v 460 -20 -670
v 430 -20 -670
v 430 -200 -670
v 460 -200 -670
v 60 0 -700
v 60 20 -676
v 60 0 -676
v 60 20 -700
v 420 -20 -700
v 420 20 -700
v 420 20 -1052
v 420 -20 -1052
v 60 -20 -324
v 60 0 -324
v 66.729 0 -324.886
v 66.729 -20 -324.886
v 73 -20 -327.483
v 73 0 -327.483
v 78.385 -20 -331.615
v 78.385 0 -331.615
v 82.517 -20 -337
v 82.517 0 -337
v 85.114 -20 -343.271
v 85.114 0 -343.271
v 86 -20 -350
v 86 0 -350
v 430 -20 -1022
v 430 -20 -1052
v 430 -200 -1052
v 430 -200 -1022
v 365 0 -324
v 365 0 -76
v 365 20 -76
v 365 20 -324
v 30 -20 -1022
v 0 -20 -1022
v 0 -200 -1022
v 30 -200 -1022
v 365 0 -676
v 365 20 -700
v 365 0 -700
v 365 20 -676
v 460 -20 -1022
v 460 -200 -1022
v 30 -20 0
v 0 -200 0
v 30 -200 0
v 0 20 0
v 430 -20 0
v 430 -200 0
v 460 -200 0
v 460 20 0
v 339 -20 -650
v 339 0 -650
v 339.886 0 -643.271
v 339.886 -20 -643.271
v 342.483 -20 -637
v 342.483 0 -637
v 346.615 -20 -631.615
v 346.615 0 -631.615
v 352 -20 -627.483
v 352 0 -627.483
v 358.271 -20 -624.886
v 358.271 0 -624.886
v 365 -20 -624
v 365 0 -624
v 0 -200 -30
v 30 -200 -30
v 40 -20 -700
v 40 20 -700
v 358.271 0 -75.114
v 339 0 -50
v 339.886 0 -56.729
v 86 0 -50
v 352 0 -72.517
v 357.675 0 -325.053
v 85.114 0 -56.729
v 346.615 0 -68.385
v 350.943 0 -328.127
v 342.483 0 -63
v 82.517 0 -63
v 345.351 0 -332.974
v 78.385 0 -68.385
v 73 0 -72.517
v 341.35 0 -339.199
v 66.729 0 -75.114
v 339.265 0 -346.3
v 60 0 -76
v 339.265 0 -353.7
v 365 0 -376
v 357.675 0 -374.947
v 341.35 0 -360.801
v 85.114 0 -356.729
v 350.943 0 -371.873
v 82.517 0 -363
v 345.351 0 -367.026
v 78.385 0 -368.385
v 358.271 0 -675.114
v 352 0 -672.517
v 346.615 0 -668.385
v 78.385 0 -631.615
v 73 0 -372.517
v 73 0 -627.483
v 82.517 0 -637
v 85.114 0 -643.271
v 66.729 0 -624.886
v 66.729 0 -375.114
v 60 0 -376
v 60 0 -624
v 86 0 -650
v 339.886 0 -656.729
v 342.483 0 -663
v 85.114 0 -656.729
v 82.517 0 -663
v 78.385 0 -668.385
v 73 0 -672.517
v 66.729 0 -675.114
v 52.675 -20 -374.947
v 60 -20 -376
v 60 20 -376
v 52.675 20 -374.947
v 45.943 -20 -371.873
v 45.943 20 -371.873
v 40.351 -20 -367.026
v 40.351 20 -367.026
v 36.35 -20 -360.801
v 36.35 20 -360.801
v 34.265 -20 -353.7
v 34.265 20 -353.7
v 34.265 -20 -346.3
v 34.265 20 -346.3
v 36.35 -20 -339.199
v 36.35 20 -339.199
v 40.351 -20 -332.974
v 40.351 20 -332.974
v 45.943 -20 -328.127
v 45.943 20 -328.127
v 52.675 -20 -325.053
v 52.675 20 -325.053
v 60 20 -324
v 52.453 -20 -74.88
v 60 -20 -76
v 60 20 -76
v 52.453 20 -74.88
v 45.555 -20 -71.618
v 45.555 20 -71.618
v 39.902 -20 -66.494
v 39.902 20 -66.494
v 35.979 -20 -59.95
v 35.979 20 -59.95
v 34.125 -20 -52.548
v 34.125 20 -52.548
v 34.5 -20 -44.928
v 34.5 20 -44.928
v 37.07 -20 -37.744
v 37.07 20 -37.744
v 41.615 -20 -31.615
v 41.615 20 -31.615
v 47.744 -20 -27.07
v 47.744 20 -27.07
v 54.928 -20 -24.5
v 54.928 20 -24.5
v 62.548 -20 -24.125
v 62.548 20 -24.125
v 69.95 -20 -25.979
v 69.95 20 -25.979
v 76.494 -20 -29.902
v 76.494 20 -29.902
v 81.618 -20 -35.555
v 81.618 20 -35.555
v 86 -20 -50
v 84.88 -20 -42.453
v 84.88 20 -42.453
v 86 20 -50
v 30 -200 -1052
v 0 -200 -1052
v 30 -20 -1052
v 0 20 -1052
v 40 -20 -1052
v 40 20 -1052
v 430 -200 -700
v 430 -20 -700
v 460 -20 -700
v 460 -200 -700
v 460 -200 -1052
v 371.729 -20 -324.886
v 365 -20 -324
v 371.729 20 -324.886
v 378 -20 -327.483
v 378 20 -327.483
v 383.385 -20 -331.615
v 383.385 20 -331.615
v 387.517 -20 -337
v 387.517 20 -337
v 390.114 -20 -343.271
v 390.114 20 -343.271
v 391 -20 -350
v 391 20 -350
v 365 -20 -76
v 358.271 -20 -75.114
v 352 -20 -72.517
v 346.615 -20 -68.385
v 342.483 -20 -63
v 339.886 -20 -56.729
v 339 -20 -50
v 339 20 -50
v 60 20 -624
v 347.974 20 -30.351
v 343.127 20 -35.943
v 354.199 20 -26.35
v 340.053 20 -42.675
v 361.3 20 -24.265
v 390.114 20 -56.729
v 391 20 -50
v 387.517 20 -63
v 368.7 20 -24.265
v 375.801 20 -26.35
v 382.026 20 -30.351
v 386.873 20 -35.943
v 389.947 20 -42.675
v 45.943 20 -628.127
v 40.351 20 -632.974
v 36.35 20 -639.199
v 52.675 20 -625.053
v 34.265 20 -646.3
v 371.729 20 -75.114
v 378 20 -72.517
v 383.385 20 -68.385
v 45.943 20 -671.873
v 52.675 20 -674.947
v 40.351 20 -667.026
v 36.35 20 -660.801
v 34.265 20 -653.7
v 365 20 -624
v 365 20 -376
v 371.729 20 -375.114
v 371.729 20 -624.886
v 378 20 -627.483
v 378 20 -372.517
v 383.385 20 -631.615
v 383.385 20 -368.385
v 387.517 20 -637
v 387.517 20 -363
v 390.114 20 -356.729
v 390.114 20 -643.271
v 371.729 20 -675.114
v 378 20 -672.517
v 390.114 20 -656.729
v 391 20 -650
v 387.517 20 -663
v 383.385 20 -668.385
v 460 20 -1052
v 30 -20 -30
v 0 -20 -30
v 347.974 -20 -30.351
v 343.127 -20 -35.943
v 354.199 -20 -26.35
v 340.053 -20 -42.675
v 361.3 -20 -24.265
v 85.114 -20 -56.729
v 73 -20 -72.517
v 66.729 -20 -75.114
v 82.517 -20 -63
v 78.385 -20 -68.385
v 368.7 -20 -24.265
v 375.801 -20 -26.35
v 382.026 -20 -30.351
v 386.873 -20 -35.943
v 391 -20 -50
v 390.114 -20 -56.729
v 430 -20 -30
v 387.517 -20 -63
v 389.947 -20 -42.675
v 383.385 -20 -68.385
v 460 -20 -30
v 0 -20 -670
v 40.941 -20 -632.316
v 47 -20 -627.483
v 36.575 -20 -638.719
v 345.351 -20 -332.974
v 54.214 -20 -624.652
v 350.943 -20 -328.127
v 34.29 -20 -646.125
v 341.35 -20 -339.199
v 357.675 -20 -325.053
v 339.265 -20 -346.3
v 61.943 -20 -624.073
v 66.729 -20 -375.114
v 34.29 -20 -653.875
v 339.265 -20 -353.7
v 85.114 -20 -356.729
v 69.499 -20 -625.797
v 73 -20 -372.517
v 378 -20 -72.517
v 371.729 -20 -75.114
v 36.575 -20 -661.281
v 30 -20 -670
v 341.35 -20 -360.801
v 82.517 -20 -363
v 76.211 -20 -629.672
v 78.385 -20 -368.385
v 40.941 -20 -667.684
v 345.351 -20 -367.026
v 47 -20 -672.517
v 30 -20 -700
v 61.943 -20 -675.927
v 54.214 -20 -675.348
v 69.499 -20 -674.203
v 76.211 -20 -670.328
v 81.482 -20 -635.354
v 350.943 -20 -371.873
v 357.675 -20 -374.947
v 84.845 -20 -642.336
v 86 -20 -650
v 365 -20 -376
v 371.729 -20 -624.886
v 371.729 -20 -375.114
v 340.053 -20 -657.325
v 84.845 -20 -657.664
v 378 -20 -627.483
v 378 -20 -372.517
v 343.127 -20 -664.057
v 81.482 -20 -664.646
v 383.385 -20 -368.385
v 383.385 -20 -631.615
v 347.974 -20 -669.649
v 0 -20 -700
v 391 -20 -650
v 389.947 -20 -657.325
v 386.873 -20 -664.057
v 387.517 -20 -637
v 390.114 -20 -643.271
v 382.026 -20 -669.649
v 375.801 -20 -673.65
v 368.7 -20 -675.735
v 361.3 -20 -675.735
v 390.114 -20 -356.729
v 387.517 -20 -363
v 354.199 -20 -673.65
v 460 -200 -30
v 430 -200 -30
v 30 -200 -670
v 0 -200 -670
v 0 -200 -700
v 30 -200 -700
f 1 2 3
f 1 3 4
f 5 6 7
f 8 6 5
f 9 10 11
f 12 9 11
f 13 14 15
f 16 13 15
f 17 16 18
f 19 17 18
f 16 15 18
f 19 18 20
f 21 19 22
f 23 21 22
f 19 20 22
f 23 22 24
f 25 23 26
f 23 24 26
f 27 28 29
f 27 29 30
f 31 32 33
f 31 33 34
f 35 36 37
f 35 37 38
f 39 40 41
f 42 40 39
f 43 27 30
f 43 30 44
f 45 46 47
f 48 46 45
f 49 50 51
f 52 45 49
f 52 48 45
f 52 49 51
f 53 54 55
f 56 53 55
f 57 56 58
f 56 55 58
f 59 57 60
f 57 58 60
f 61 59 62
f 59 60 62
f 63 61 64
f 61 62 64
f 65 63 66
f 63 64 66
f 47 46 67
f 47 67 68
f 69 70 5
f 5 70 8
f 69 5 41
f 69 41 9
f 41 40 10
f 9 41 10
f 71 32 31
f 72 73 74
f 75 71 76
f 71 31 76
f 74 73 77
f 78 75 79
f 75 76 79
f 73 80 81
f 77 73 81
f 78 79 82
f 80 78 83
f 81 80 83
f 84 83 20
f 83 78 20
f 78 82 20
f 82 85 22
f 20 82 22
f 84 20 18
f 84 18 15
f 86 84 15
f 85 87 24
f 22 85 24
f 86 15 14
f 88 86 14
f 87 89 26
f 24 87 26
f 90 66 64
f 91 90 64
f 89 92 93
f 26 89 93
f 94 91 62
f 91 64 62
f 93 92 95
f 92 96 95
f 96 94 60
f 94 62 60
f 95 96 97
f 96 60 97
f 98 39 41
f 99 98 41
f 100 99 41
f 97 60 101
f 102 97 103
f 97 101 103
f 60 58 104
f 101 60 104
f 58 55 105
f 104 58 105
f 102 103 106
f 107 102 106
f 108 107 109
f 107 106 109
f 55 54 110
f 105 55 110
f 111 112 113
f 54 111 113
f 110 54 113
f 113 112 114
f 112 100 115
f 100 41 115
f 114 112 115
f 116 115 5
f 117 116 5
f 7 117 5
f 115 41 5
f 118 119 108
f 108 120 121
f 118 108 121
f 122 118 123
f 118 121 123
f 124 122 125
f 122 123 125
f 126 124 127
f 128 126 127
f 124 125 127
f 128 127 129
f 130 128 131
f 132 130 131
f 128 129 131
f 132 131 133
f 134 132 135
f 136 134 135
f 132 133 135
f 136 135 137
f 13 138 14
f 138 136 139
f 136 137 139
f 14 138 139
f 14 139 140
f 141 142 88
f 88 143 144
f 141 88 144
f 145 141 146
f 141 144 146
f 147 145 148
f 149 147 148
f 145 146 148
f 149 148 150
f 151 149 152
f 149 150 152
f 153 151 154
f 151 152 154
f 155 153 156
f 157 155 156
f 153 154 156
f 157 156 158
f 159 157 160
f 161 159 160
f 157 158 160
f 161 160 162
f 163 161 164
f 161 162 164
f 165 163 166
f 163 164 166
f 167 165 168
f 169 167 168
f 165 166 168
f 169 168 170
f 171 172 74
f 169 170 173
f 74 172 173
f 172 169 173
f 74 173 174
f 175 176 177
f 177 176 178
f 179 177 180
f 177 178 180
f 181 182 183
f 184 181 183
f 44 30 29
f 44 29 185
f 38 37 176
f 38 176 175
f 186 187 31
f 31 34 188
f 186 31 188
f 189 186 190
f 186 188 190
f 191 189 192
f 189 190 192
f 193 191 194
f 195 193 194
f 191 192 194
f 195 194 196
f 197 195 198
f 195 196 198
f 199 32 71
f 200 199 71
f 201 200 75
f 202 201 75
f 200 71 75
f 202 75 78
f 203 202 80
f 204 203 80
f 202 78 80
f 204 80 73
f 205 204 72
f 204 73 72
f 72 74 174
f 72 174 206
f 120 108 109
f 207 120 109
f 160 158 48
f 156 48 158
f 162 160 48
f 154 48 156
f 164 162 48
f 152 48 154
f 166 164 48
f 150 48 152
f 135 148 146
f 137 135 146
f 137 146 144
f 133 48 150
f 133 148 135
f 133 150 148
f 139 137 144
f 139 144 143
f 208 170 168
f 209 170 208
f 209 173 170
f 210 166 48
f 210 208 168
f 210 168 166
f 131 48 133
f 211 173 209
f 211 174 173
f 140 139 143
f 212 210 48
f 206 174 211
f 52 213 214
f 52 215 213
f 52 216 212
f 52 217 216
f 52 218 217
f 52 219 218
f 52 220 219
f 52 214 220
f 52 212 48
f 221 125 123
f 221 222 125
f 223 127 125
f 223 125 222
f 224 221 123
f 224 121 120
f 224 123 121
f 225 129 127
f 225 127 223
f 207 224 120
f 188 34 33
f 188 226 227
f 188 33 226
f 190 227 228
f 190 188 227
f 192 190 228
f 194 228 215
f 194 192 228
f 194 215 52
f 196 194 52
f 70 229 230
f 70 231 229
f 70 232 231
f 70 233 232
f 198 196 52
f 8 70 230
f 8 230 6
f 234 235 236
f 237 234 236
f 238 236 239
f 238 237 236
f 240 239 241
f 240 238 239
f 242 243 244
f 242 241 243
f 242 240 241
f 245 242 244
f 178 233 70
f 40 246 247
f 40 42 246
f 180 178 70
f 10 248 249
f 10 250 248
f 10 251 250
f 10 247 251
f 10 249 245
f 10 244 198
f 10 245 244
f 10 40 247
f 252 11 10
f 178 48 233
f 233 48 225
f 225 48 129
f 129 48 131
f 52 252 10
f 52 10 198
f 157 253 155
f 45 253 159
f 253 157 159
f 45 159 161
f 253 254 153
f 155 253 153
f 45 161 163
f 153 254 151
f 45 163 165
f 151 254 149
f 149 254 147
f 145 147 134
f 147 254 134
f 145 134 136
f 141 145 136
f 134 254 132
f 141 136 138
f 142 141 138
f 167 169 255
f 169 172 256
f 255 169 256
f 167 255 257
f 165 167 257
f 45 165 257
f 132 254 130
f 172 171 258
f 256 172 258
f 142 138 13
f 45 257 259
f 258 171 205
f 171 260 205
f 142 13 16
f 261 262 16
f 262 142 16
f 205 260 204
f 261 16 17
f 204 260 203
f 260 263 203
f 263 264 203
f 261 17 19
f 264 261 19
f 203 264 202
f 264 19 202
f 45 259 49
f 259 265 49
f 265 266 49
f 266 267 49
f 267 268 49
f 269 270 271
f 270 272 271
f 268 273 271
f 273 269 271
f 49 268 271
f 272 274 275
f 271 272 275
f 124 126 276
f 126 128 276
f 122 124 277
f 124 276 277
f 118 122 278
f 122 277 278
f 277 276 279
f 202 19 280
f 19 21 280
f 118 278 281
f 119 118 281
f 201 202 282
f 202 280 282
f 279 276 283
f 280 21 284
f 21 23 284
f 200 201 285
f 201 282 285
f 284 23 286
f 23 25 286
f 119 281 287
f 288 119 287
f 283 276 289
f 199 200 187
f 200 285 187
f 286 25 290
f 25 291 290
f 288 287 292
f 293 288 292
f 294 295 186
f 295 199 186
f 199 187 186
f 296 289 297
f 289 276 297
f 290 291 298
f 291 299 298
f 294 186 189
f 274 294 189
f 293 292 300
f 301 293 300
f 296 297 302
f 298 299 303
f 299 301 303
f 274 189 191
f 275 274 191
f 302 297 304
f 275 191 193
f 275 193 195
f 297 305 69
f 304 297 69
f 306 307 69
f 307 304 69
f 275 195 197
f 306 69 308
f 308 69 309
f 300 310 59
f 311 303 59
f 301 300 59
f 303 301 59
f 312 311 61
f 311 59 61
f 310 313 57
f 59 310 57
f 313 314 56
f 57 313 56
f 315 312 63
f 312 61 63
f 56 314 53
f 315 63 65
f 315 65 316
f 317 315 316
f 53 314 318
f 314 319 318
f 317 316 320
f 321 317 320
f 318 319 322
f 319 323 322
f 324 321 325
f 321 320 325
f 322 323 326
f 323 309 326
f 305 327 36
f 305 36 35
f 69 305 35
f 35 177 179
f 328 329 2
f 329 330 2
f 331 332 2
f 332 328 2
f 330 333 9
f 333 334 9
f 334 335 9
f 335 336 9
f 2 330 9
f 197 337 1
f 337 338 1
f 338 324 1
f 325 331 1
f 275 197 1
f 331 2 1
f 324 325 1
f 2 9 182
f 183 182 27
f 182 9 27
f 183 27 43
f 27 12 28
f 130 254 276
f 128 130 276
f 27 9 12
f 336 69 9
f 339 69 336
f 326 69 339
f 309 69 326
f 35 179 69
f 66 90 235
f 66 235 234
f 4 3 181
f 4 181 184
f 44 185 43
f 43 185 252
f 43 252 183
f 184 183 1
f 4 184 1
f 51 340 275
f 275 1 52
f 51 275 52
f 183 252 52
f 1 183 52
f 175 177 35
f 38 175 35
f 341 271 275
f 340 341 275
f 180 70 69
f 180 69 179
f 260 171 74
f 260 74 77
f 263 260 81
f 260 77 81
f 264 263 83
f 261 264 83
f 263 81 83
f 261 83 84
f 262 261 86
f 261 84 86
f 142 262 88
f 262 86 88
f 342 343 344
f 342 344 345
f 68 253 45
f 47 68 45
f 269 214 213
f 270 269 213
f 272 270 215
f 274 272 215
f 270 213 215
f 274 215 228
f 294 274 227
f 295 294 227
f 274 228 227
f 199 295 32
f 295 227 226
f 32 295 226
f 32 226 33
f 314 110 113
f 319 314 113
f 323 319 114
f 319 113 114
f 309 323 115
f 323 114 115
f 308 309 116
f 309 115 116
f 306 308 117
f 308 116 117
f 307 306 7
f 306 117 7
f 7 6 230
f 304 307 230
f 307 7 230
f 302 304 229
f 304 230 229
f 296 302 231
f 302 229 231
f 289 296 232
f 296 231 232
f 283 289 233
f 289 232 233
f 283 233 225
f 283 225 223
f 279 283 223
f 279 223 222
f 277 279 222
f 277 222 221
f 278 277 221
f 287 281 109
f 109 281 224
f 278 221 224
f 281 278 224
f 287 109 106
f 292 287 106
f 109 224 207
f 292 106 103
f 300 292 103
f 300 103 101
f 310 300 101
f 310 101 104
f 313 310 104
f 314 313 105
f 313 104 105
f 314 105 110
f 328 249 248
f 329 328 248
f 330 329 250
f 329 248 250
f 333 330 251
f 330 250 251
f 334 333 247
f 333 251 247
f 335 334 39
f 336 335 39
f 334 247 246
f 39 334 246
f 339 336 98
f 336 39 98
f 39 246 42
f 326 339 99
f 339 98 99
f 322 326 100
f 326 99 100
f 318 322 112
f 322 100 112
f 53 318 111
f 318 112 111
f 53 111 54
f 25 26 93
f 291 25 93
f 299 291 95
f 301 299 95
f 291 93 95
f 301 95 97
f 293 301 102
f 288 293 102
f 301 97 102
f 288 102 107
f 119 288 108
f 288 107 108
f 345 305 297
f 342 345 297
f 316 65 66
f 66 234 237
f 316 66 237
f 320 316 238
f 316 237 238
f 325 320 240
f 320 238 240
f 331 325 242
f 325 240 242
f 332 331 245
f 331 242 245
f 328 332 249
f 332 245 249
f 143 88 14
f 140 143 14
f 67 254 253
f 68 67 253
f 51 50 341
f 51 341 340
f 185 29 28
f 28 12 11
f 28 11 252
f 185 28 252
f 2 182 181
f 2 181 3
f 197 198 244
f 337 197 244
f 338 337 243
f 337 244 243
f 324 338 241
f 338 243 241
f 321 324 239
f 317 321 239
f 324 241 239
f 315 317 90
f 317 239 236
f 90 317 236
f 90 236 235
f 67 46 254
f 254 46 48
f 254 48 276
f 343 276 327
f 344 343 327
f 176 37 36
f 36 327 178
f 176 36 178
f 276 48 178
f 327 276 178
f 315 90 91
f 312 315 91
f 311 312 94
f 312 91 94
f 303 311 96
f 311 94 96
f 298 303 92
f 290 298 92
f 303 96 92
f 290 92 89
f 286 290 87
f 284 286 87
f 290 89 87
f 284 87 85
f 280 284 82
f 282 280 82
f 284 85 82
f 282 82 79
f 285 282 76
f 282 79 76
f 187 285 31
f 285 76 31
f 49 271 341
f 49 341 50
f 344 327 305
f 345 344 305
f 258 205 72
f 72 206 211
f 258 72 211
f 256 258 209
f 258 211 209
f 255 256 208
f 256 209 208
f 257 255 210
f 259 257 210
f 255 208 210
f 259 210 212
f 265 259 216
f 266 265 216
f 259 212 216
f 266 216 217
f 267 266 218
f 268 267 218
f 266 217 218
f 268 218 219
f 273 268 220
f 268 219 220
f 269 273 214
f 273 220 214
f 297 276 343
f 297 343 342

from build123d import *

# Parameters (mm, degrees)
SKETCH2_W           = 460
SKETCH2_H           = 700
SKETCH2_W_2         = 305
SKETCH2_H_2         = 600
BOSS_EXTRUDE1_DEPTH = 20
SKETCH10_W          = 460
SKETCH10_H          = 700
BOSS_EXTRUDE6_DEPTH = 20
SKETCH11_W          = 30
SKETCH11_H          = 30
BOSS_EXTRUDE7_DEPTH = 180
SKETCH14_W          = 40
SKETCH14_H          = 352
BOSS_EXTRUDE8_DEPTH = 40
SKETCH15_W          = 30
SKETCH15_H          = 30
BOSS_EXTRUDE9_DEPTH = 180
SKETCH17_R          = 26
CUT_EXTRUDE1_DEPTH  = 60
CUT_EXTRUDE2_DEPTH  = 20


with BuildPart() as part:
    # Sketch2 → Boss-Extrude1 (new body)
    with BuildSketch(Plane(origin=(0, 0, 0), x_dir=(1, 0, 0), z_dir=(0, 1, 0))):
        with Locations((230, 350)):
            Rectangle(SKETCH2_W, SKETCH2_H)
        with Locations((212.5, 350)):
            Rectangle(SKETCH2_W_2, SKETCH2_H_2, mode=Mode.SUBTRACT)
    extrude(amount=BOSS_EXTRUDE1_DEPTH)

    # Sketch10 → Boss-Extrude6 (add)
    with BuildSketch(Plane.XZ):
        with Locations((230, -350)):
            Rectangle(SKETCH10_W, SKETCH10_H)
    extrude(amount=BOSS_EXTRUDE6_DEPTH)

    # Sketch11 → Boss-Extrude7 (add)
    with BuildSketch(Plane.XZ.offset(20)):
        with Locations((15, -15)):
            Rectangle(SKETCH11_W, SKETCH11_H)
        with Locations((445, -15)):
            Rectangle(SKETCH11_W, SKETCH11_H)
        with Locations((15, -685)):
            Rectangle(SKETCH11_W, SKETCH11_H)
        with Locations((445, -685)):
            Rectangle(SKETCH11_W, SKETCH11_H)
    extrude(amount=BOSS_EXTRUDE7_DEPTH)

    # Sketch14 → Boss-Extrude8 (add)
    with BuildSketch(Plane(origin=(0, 20, 0), x_dir=(1, 0, 0), z_dir=(0, 1, 0))):
        with Locations((20, 876)):
            Rectangle(SKETCH14_W, SKETCH14_H)
        with Locations((440, 876)):
            Rectangle(SKETCH14_W, SKETCH14_H)
    extrude(amount=-BOSS_EXTRUDE8_DEPTH)

    # Sketch15 → Boss-Extrude9 (add)
    with BuildSketch(Plane.XZ.offset(20)):
        with Locations((445, -1037)):
            Rectangle(SKETCH15_W, SKETCH15_H)
        with Locations((15, -1037)):
            Rectangle(SKETCH15_W, SKETCH15_H)
    extrude(amount=BOSS_EXTRUDE9_DEPTH)

    # Sketch17 → Cut-Extrude1 (cut)
    with BuildSketch(Plane(origin=(0, 20, 0), x_dir=(1, 0, 0), z_dir=(0, 1, 0))):
        with BuildLine():
            Line((365, 650), (339, 650))
            ThreePointArc((339, 650), (346.615223689, 631.615223689), (365, 624))
            Line((365, 624), (365, 650))
        make_face()
        with BuildLine():
            ThreePointArc((391, 650), (365, 676), (339, 650))
            Line((339, 650), (365, 650))
            Line((365, 650), (365, 624))
            ThreePointArc((365, 624), (383.384776311, 631.615223689), (391, 650))
        make_face()
        with BuildLine():
            Line((365, 324), (365, 376))
            ThreePointArc((365, 376), (339, 350), (365, 324))
        make_face()
        with BuildLine():
            ThreePointArc((391, 350), (383.384776311, 368.384776311), (365, 376))
            Line((365, 376), (365, 324))
            ThreePointArc((365, 324), (383.384776311, 331.615223689), (391, 350))
        make_face()
        with BuildLine():
            Line((365, 50), (365, 76))
            ThreePointArc((365, 76), (346.615223689, 68.384776311), (339, 50))
            Line((339, 50), (365, 50))
        make_face()
        with BuildLine():
            ThreePointArc((391, 50), (383.384776311, 68.384776311), (365, 76))
            Line((365, 76), (365, 50))
            Line((365, 50), (339, 50))
            ThreePointArc((339, 50), (365, 24), (391, 50))
        make_face()
        with BuildLine():
            Line((60, 324), (60, 376))
            ThreePointArc((60, 376), (34, 350), (60, 324))
        make_face()
        with BuildLine():
            ThreePointArc((86, 350), (78.384776311, 368.384776311), (60, 376))
            Line((60, 376), (60, 324))
            ThreePointArc((60, 324), (78.384776311, 331.615223689), (86, 350))
        make_face()
        with BuildLine():
            Line((60, 50), (60, 76))
            ThreePointArc((60, 76), (41.615223689, 31.615223689), (86, 50))
            Line((86, 50), (60, 50))
        make_face()
        with BuildLine():
            ThreePointArc((86, 50), (78.384776311, 68.384776311), (60, 76))
            Line((60, 76), (60, 50))
            Line((60, 50), (86, 50))
        make_face()
        with Locations((60, 650)):
            Circle(SKETCH17_R)
    extrude(amount=-CUT_EXTRUDE1_DEPTH, mode=Mode.SUBTRACT)

    # Sketch18 → Cut-Extrude2 (cut)
    with BuildSketch(Plane(origin=(0, 20, 0), x_dir=(1, 0, 0), z_dir=(0, 1, 0))):
        Polygon((60, 700), (365, 700), (365, 650), (212.5, 650), (60, 650), align=None)
    extrude(amount=-CUT_EXTRUDE2_DEPTH, mode=Mode.SUBTRACT)


solid = part.part
